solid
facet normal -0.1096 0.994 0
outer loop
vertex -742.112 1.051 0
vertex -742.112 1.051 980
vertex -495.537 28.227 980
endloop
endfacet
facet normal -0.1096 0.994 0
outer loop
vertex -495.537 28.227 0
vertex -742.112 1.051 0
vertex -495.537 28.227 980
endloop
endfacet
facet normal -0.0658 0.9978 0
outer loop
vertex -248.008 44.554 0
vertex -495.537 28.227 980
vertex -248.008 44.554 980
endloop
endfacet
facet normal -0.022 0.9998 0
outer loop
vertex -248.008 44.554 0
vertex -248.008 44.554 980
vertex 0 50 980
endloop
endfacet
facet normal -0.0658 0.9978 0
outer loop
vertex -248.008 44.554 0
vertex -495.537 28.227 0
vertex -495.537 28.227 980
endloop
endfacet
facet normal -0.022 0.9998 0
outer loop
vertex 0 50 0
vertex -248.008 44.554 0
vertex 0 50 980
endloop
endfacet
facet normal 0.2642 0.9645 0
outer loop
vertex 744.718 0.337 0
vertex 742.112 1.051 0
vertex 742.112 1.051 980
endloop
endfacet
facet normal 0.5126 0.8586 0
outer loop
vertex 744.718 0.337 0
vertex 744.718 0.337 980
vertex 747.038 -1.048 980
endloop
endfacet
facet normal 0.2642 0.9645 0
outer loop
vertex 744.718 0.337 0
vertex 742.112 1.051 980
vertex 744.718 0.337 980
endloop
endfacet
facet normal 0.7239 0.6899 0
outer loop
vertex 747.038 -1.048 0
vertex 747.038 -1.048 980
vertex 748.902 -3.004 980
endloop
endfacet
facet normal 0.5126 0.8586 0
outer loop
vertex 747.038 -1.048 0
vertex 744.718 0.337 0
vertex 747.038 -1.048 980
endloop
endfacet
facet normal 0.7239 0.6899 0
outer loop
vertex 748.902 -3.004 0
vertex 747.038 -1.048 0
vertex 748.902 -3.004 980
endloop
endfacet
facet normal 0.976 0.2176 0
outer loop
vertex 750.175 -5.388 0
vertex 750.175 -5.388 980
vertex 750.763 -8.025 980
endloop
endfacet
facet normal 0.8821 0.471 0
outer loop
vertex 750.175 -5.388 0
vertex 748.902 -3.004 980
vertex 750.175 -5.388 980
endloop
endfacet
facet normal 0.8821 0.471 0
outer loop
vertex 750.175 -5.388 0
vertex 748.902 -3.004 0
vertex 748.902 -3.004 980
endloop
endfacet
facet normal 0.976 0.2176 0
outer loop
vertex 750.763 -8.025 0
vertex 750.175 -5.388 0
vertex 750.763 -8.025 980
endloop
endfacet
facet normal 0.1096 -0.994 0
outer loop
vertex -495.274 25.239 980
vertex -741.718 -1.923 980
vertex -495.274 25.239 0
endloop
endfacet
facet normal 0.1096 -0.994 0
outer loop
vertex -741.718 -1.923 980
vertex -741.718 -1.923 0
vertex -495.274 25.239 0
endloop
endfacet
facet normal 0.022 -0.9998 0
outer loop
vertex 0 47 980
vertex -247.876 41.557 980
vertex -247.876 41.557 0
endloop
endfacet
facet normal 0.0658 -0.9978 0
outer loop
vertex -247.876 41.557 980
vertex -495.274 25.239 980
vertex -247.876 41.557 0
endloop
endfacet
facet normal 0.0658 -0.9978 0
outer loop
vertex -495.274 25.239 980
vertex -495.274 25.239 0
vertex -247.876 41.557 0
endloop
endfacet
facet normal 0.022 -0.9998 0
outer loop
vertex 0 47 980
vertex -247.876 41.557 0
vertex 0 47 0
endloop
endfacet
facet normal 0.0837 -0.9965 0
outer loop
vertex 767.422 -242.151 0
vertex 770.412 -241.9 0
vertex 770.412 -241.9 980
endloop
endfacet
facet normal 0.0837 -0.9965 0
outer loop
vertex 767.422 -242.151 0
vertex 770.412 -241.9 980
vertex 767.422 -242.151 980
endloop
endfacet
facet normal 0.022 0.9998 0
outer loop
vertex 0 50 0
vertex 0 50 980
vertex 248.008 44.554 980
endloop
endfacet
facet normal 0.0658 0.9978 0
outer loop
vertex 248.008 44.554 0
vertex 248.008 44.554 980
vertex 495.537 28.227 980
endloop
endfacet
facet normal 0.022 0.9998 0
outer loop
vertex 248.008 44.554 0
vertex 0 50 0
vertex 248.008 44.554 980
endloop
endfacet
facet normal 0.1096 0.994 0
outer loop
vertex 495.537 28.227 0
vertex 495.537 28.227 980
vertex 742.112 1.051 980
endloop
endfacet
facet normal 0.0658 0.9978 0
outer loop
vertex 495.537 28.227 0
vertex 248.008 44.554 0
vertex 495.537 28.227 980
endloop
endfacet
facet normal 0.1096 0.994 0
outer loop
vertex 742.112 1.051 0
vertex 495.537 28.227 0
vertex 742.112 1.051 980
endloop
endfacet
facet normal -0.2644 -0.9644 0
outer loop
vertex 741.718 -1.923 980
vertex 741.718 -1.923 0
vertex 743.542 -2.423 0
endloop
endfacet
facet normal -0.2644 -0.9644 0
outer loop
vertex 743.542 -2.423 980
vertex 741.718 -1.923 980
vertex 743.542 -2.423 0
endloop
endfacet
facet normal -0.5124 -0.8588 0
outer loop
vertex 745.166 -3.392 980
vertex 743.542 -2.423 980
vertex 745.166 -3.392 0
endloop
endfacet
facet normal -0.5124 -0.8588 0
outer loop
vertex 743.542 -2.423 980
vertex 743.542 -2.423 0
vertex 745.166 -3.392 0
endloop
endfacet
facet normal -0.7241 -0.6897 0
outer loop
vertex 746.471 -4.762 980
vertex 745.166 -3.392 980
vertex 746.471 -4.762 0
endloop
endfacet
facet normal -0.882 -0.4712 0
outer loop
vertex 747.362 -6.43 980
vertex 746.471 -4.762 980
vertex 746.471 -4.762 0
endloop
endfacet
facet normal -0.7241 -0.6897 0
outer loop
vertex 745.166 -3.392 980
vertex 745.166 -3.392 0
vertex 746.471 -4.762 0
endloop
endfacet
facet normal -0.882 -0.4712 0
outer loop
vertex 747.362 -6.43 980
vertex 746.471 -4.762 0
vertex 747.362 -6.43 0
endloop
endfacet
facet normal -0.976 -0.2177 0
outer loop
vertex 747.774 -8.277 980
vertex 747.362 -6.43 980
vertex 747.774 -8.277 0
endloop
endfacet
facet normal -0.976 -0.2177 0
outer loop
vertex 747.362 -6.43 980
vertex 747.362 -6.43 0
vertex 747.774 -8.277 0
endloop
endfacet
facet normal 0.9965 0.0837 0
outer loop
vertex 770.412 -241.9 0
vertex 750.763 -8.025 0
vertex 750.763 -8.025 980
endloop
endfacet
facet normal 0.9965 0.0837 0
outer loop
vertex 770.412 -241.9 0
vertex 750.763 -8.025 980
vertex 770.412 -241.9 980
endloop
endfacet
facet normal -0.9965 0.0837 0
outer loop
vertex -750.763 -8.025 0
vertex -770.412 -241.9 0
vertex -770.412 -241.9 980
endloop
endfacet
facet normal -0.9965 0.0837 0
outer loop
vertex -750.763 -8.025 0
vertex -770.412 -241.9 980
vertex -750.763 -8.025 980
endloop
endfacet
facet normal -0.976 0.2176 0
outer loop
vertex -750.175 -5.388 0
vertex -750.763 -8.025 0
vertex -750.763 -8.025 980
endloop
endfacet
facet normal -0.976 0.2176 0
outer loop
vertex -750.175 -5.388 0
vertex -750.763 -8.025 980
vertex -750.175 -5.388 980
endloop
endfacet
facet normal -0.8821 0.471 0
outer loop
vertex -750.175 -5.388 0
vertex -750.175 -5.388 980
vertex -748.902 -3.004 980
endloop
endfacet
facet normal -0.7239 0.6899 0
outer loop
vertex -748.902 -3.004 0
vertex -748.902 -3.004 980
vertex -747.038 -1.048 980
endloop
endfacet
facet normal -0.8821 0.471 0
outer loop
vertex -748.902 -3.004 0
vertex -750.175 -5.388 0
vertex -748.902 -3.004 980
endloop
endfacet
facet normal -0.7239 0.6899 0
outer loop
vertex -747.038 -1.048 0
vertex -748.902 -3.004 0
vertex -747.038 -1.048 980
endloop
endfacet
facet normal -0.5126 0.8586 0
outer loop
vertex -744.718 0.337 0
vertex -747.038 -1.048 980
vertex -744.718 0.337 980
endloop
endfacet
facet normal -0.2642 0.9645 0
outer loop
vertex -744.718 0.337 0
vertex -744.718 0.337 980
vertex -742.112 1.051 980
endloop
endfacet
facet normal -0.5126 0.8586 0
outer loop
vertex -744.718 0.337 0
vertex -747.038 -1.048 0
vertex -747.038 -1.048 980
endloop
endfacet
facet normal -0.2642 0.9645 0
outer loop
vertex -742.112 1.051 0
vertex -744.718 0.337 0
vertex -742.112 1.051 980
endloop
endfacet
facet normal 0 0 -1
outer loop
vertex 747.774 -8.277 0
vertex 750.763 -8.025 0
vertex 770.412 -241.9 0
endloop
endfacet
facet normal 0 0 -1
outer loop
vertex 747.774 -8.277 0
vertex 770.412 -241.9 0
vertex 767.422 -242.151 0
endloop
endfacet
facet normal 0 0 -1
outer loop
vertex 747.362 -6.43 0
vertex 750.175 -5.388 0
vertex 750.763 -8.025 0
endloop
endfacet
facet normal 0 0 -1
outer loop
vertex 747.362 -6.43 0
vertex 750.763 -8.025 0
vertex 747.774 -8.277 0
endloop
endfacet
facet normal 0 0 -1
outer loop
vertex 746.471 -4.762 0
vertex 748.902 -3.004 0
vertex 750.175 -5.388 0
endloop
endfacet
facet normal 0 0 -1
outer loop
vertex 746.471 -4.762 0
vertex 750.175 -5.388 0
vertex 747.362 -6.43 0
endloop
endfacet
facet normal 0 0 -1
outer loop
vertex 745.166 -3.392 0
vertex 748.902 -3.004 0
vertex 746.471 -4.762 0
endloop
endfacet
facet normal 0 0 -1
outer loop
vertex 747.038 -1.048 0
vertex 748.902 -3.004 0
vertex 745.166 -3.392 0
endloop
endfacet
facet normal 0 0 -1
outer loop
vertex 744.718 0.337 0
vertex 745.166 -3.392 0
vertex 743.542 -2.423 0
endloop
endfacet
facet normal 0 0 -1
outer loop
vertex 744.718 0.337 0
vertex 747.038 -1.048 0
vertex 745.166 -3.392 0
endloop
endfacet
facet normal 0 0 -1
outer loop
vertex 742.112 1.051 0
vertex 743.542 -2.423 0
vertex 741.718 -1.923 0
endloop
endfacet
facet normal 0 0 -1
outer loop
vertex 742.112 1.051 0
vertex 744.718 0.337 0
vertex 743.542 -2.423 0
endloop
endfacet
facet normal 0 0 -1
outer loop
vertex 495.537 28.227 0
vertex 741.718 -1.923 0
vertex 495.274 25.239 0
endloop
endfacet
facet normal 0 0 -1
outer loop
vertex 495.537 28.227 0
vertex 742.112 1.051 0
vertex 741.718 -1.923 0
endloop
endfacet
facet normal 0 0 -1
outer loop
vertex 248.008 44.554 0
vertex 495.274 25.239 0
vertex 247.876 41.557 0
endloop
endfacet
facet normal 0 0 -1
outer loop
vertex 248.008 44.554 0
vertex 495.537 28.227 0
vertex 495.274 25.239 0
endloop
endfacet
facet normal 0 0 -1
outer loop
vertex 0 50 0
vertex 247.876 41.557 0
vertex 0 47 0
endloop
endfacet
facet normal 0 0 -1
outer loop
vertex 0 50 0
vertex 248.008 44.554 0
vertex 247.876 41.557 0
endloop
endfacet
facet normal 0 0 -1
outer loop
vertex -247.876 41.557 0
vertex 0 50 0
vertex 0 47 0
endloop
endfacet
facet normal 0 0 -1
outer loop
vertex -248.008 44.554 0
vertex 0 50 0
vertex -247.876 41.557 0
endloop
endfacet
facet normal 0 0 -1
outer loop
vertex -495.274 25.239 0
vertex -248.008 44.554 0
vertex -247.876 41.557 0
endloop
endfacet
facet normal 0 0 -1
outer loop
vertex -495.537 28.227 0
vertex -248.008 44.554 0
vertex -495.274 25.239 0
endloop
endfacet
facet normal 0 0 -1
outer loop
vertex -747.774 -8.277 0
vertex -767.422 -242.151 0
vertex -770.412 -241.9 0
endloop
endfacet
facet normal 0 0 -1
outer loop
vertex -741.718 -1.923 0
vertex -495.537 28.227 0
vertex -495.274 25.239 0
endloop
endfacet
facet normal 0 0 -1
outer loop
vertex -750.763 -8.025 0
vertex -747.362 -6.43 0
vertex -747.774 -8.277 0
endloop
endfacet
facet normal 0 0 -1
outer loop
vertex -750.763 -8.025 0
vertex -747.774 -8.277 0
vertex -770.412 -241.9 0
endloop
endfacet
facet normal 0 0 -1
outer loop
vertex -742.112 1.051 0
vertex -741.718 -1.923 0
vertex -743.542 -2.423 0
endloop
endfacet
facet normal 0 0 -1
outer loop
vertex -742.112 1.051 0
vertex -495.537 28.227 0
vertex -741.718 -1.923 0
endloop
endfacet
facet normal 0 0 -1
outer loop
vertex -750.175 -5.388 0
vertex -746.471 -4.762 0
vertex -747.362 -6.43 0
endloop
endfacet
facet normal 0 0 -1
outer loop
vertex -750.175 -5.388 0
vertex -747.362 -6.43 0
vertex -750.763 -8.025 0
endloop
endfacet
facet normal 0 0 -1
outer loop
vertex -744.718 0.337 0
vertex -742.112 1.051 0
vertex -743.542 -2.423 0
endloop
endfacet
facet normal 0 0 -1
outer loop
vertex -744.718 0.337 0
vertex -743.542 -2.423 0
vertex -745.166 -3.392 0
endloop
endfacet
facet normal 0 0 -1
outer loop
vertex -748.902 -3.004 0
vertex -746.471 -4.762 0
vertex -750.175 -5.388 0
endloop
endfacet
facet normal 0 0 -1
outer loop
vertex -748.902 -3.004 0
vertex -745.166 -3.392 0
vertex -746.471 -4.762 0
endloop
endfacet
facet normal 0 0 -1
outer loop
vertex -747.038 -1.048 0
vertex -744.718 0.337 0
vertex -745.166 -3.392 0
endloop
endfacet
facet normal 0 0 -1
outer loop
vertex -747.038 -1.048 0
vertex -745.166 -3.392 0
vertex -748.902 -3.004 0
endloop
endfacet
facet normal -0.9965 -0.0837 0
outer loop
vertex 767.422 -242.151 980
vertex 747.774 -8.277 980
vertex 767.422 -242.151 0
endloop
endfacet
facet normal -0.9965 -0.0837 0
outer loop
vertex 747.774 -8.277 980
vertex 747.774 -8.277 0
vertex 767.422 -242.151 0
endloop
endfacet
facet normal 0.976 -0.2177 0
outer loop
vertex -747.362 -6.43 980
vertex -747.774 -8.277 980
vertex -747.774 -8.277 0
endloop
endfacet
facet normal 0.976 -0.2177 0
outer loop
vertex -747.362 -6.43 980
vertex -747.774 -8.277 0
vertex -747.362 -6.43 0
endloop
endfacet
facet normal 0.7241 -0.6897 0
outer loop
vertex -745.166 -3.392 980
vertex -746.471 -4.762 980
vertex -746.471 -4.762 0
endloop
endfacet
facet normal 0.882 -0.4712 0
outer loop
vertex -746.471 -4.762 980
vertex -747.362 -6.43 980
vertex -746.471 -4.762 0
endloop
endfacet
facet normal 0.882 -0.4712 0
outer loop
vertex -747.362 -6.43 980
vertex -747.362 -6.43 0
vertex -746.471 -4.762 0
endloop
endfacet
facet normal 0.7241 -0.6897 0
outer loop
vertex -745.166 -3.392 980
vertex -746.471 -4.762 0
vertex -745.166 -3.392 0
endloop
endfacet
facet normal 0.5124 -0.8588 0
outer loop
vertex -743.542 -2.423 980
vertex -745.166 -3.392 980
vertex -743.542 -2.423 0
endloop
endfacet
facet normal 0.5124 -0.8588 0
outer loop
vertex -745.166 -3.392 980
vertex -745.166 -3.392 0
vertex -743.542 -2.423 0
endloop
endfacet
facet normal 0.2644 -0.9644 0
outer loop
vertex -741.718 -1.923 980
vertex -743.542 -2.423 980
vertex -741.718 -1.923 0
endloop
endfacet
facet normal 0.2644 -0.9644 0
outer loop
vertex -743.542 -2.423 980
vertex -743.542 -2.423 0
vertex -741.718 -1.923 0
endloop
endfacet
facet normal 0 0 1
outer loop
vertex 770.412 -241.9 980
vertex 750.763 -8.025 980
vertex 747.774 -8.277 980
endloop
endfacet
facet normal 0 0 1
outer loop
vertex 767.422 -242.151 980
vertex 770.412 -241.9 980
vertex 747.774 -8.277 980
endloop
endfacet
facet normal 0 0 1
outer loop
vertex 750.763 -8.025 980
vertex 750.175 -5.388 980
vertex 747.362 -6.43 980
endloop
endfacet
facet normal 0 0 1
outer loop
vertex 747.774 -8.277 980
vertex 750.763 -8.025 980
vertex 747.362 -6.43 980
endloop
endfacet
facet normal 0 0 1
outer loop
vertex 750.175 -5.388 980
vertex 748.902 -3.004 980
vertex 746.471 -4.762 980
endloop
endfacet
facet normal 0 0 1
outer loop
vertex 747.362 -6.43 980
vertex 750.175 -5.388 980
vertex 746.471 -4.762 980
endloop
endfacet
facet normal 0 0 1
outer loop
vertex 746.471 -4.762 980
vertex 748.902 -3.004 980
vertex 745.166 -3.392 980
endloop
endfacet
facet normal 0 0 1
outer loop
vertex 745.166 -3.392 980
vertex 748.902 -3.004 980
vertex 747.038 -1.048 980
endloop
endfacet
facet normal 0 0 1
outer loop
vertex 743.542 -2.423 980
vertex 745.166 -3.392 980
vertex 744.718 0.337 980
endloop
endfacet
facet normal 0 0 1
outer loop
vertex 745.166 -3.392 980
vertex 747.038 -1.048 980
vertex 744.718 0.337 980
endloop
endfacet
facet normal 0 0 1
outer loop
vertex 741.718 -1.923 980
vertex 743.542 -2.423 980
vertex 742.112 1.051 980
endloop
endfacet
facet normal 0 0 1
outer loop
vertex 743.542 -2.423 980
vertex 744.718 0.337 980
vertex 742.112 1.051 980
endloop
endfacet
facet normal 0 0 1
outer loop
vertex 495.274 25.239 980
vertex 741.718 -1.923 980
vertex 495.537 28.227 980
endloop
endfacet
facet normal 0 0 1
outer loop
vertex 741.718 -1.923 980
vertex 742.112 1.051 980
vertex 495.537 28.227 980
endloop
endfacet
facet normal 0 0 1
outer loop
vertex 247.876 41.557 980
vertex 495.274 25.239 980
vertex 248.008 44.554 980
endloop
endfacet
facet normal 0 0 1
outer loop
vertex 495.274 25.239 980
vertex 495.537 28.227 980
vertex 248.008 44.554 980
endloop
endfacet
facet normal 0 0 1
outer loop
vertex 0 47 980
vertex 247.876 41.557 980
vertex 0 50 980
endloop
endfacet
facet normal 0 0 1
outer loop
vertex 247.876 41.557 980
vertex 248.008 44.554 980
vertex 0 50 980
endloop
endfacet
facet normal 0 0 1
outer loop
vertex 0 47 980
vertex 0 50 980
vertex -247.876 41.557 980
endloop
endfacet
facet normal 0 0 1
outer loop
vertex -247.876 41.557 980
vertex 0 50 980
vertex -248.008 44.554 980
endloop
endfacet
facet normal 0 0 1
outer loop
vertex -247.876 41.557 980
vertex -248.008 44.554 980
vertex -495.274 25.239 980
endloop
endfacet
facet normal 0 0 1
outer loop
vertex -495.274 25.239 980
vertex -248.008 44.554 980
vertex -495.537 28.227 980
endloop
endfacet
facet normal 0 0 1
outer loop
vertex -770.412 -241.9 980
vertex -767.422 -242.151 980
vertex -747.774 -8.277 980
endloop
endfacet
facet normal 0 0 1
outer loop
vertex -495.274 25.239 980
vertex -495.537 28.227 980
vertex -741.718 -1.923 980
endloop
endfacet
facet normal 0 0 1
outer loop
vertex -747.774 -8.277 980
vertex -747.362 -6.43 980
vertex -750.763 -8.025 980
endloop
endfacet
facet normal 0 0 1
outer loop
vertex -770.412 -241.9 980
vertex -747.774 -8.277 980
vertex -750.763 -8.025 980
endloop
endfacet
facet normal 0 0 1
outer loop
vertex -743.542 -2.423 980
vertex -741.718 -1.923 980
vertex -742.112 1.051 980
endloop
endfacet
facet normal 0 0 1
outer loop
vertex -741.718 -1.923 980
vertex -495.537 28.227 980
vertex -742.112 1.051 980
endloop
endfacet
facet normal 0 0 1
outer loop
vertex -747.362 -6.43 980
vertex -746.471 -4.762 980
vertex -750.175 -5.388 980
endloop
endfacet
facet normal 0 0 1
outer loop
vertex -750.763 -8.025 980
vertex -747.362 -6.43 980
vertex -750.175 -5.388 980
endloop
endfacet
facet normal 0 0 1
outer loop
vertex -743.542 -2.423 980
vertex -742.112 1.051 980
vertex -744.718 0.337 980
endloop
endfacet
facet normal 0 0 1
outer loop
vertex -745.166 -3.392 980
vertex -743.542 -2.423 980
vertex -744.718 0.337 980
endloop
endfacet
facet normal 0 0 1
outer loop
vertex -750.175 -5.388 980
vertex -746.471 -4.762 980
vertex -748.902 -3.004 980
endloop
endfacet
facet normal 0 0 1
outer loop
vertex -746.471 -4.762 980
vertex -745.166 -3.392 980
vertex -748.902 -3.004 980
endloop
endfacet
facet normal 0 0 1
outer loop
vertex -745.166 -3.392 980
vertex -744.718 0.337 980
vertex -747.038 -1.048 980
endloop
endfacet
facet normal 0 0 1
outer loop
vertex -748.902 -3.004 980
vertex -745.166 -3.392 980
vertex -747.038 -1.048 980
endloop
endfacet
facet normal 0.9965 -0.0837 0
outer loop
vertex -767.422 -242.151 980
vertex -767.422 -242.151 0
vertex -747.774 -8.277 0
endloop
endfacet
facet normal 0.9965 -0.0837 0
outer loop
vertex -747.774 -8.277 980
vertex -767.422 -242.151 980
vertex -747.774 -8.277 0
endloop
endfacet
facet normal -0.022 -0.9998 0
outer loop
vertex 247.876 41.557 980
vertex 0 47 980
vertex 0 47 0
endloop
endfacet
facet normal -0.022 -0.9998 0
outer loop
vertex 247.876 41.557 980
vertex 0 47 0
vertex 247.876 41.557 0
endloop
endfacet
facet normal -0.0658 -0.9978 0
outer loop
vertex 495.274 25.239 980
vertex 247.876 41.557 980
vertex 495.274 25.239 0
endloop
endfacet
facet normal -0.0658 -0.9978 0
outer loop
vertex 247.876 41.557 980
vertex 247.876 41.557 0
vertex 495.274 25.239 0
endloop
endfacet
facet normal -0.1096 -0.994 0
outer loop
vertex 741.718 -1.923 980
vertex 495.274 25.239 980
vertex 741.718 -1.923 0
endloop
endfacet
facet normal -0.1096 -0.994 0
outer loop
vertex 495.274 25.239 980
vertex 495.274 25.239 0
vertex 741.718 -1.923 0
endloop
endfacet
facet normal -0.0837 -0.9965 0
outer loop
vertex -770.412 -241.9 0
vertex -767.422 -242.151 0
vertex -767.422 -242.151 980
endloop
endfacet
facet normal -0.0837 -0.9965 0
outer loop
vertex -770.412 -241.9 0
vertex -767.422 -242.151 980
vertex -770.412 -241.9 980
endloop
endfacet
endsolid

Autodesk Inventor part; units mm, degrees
ref_plane "YZ Plane" through (0, 0, 0) normal (1, 0, 0) x (0, 1, 0)
ref_plane "XZ Plane" through (0, 0, 0) normal (0, 1, 0) x (-1, 0, 0)
ref_plane "XY Plane" through (0, 0, 0) normal (0, 0, 1) x (1, 0, 0)
sketch "Sketch1" plane through (0, 0, 0) normal (0, 0, 1) x (1, 0, 0)
  line L0 (-750, 0) -> (750, 0) construction
  line L1 (750, 0) -> (750, -2700) construction
  line L2 (750, -2700) -> (-750, -2700) construction
  line L3 (-750, -2700) -> (-750, 0) construction
  line L4 (800, 50) -> (-800, 50) construction
  line L5 (-800, 50) -> (-800, -2750) construction
  line L6 (-800, -2750) -> (800, -2750) construction
  line L7 (800, -2750) -> (800, 50) construction
  line L8 (-850, 100) -> (850, 100) construction
  line L9 (850, 100) -> (850, -2800) construction
  line L10 (850, -2800) -> (-850, -2800) construction
  line L11 (-850, -2800) -> (-850, 100) construction
  arc A0 (750, 0) -> (742.111681, 1.050817) centre (0, -5600) ccw construction
  line L12 (-750, -2100) -> (750, -2100) construction
  line L13 (115.485997, -2697.8227) -> (750, -2100) construction
  arc A1 (750, -2100) -> (750, 0) centre (-10250, -1050) ccw construction
  arc A2 (110, -2700) -> (115.485997, -2697.8227) centre (110, -2692) ccw construction
  arc A3 (742.111681, 1.050817) -> (0, 50) centre (0, -5600) ccw
  line L14 (0, 100) -> (0, 50) construction
  line L15 (0, -2700) -> (0, -2697) construction
  line L16 (0, 47) -> (0, 0) construction
  line L17 (0, 50) -> (0, 47) construction
  line L18 (750.763103, -8.025362) -> (770.411716, -241.9)
  arc A4 (750.763103, -8.025362) -> (742.111681, 1.050817) centre (740.798209, -8.862547) ccw
  point P0 (0, -2750)
  dimension "d54" = 1500
  dimension "d55" = 2700
  dimension "d58" = 2100
  dimension "d83" = 8
  dimension "d113" = 50
  dimension "d114" = 50
  dimension "d115" = 3
  dimension "d121" = 10
  dimension "d122" = 241.9
  dimension "d124" = 94.8023
contour flange "Contour Flange2" sketch "Sketch1" thickness 3 bend radius 5 width 980 along (0, 0, 1) mid plane no both sides no wall seen from (760.58741, -124.962681, 0) lies toward (-0.9964894, -0.0837185, 0) curves L18 A4 A3
bend "Bend2"
corner "Corner2"
mirror "Mirror2" about plane through (0, 0, 0) normal (1, 0, 0)
sketch "Sketch2" plane through (747.773635, -8.276518, 0) normal (-0.9964894, -0.0837185, 0) x (0, 0, 1)
  line L0 (963.847804, -212.844904) -> (852.423188, -212.844904) construction
  line L1 (852.423188, -212.844904) -> (852.423188, -183.740468) construction
  line L2 (852.423188, -183.740468) -> (963.847804, -183.740468) construction
  line L3 (963.847804, -183.740468) -> (963.847804, -212.844904) construction
  point P0 (0, 70.849954)
mark "Mark1"
equation "\"d36\" = Thickness"
equation "\"d37\" = BendReliefWidth"
equation "\"d38\" = BendReliefDepth"
equation "\"d39\" = MinimumRemnant"
equation "\"d40\" = TransitionRadius"
equation "\"d42\" = BendRadius"
equation "\"d44\" = CornerReliefSize"
equation "\"d45\" = GapSize"
equation "\"d46\" = JacobiRadiusSize"
equation "\"BendReliefWidth\" = Thickness"
equation "\"BendReliefDepth\" = 0.5 * Thickness"
equation "\"CornerReliefSize\" = 4 * Thickness"
equation "\"MinimumRemnant\" = 2 * Thickness"
equation "\"GapSize\" = Thickness"
equation "\"Thickness\" = 3"
equation "\"TransitionRadius\" = 5"
equation "\"BendRadius\" = 5"
equation "\"JacobiRadiusSize\" = 5"
properties part number "MSC 201 SHEET BACK BASIC" material "Stainless Steel AISI 304"
